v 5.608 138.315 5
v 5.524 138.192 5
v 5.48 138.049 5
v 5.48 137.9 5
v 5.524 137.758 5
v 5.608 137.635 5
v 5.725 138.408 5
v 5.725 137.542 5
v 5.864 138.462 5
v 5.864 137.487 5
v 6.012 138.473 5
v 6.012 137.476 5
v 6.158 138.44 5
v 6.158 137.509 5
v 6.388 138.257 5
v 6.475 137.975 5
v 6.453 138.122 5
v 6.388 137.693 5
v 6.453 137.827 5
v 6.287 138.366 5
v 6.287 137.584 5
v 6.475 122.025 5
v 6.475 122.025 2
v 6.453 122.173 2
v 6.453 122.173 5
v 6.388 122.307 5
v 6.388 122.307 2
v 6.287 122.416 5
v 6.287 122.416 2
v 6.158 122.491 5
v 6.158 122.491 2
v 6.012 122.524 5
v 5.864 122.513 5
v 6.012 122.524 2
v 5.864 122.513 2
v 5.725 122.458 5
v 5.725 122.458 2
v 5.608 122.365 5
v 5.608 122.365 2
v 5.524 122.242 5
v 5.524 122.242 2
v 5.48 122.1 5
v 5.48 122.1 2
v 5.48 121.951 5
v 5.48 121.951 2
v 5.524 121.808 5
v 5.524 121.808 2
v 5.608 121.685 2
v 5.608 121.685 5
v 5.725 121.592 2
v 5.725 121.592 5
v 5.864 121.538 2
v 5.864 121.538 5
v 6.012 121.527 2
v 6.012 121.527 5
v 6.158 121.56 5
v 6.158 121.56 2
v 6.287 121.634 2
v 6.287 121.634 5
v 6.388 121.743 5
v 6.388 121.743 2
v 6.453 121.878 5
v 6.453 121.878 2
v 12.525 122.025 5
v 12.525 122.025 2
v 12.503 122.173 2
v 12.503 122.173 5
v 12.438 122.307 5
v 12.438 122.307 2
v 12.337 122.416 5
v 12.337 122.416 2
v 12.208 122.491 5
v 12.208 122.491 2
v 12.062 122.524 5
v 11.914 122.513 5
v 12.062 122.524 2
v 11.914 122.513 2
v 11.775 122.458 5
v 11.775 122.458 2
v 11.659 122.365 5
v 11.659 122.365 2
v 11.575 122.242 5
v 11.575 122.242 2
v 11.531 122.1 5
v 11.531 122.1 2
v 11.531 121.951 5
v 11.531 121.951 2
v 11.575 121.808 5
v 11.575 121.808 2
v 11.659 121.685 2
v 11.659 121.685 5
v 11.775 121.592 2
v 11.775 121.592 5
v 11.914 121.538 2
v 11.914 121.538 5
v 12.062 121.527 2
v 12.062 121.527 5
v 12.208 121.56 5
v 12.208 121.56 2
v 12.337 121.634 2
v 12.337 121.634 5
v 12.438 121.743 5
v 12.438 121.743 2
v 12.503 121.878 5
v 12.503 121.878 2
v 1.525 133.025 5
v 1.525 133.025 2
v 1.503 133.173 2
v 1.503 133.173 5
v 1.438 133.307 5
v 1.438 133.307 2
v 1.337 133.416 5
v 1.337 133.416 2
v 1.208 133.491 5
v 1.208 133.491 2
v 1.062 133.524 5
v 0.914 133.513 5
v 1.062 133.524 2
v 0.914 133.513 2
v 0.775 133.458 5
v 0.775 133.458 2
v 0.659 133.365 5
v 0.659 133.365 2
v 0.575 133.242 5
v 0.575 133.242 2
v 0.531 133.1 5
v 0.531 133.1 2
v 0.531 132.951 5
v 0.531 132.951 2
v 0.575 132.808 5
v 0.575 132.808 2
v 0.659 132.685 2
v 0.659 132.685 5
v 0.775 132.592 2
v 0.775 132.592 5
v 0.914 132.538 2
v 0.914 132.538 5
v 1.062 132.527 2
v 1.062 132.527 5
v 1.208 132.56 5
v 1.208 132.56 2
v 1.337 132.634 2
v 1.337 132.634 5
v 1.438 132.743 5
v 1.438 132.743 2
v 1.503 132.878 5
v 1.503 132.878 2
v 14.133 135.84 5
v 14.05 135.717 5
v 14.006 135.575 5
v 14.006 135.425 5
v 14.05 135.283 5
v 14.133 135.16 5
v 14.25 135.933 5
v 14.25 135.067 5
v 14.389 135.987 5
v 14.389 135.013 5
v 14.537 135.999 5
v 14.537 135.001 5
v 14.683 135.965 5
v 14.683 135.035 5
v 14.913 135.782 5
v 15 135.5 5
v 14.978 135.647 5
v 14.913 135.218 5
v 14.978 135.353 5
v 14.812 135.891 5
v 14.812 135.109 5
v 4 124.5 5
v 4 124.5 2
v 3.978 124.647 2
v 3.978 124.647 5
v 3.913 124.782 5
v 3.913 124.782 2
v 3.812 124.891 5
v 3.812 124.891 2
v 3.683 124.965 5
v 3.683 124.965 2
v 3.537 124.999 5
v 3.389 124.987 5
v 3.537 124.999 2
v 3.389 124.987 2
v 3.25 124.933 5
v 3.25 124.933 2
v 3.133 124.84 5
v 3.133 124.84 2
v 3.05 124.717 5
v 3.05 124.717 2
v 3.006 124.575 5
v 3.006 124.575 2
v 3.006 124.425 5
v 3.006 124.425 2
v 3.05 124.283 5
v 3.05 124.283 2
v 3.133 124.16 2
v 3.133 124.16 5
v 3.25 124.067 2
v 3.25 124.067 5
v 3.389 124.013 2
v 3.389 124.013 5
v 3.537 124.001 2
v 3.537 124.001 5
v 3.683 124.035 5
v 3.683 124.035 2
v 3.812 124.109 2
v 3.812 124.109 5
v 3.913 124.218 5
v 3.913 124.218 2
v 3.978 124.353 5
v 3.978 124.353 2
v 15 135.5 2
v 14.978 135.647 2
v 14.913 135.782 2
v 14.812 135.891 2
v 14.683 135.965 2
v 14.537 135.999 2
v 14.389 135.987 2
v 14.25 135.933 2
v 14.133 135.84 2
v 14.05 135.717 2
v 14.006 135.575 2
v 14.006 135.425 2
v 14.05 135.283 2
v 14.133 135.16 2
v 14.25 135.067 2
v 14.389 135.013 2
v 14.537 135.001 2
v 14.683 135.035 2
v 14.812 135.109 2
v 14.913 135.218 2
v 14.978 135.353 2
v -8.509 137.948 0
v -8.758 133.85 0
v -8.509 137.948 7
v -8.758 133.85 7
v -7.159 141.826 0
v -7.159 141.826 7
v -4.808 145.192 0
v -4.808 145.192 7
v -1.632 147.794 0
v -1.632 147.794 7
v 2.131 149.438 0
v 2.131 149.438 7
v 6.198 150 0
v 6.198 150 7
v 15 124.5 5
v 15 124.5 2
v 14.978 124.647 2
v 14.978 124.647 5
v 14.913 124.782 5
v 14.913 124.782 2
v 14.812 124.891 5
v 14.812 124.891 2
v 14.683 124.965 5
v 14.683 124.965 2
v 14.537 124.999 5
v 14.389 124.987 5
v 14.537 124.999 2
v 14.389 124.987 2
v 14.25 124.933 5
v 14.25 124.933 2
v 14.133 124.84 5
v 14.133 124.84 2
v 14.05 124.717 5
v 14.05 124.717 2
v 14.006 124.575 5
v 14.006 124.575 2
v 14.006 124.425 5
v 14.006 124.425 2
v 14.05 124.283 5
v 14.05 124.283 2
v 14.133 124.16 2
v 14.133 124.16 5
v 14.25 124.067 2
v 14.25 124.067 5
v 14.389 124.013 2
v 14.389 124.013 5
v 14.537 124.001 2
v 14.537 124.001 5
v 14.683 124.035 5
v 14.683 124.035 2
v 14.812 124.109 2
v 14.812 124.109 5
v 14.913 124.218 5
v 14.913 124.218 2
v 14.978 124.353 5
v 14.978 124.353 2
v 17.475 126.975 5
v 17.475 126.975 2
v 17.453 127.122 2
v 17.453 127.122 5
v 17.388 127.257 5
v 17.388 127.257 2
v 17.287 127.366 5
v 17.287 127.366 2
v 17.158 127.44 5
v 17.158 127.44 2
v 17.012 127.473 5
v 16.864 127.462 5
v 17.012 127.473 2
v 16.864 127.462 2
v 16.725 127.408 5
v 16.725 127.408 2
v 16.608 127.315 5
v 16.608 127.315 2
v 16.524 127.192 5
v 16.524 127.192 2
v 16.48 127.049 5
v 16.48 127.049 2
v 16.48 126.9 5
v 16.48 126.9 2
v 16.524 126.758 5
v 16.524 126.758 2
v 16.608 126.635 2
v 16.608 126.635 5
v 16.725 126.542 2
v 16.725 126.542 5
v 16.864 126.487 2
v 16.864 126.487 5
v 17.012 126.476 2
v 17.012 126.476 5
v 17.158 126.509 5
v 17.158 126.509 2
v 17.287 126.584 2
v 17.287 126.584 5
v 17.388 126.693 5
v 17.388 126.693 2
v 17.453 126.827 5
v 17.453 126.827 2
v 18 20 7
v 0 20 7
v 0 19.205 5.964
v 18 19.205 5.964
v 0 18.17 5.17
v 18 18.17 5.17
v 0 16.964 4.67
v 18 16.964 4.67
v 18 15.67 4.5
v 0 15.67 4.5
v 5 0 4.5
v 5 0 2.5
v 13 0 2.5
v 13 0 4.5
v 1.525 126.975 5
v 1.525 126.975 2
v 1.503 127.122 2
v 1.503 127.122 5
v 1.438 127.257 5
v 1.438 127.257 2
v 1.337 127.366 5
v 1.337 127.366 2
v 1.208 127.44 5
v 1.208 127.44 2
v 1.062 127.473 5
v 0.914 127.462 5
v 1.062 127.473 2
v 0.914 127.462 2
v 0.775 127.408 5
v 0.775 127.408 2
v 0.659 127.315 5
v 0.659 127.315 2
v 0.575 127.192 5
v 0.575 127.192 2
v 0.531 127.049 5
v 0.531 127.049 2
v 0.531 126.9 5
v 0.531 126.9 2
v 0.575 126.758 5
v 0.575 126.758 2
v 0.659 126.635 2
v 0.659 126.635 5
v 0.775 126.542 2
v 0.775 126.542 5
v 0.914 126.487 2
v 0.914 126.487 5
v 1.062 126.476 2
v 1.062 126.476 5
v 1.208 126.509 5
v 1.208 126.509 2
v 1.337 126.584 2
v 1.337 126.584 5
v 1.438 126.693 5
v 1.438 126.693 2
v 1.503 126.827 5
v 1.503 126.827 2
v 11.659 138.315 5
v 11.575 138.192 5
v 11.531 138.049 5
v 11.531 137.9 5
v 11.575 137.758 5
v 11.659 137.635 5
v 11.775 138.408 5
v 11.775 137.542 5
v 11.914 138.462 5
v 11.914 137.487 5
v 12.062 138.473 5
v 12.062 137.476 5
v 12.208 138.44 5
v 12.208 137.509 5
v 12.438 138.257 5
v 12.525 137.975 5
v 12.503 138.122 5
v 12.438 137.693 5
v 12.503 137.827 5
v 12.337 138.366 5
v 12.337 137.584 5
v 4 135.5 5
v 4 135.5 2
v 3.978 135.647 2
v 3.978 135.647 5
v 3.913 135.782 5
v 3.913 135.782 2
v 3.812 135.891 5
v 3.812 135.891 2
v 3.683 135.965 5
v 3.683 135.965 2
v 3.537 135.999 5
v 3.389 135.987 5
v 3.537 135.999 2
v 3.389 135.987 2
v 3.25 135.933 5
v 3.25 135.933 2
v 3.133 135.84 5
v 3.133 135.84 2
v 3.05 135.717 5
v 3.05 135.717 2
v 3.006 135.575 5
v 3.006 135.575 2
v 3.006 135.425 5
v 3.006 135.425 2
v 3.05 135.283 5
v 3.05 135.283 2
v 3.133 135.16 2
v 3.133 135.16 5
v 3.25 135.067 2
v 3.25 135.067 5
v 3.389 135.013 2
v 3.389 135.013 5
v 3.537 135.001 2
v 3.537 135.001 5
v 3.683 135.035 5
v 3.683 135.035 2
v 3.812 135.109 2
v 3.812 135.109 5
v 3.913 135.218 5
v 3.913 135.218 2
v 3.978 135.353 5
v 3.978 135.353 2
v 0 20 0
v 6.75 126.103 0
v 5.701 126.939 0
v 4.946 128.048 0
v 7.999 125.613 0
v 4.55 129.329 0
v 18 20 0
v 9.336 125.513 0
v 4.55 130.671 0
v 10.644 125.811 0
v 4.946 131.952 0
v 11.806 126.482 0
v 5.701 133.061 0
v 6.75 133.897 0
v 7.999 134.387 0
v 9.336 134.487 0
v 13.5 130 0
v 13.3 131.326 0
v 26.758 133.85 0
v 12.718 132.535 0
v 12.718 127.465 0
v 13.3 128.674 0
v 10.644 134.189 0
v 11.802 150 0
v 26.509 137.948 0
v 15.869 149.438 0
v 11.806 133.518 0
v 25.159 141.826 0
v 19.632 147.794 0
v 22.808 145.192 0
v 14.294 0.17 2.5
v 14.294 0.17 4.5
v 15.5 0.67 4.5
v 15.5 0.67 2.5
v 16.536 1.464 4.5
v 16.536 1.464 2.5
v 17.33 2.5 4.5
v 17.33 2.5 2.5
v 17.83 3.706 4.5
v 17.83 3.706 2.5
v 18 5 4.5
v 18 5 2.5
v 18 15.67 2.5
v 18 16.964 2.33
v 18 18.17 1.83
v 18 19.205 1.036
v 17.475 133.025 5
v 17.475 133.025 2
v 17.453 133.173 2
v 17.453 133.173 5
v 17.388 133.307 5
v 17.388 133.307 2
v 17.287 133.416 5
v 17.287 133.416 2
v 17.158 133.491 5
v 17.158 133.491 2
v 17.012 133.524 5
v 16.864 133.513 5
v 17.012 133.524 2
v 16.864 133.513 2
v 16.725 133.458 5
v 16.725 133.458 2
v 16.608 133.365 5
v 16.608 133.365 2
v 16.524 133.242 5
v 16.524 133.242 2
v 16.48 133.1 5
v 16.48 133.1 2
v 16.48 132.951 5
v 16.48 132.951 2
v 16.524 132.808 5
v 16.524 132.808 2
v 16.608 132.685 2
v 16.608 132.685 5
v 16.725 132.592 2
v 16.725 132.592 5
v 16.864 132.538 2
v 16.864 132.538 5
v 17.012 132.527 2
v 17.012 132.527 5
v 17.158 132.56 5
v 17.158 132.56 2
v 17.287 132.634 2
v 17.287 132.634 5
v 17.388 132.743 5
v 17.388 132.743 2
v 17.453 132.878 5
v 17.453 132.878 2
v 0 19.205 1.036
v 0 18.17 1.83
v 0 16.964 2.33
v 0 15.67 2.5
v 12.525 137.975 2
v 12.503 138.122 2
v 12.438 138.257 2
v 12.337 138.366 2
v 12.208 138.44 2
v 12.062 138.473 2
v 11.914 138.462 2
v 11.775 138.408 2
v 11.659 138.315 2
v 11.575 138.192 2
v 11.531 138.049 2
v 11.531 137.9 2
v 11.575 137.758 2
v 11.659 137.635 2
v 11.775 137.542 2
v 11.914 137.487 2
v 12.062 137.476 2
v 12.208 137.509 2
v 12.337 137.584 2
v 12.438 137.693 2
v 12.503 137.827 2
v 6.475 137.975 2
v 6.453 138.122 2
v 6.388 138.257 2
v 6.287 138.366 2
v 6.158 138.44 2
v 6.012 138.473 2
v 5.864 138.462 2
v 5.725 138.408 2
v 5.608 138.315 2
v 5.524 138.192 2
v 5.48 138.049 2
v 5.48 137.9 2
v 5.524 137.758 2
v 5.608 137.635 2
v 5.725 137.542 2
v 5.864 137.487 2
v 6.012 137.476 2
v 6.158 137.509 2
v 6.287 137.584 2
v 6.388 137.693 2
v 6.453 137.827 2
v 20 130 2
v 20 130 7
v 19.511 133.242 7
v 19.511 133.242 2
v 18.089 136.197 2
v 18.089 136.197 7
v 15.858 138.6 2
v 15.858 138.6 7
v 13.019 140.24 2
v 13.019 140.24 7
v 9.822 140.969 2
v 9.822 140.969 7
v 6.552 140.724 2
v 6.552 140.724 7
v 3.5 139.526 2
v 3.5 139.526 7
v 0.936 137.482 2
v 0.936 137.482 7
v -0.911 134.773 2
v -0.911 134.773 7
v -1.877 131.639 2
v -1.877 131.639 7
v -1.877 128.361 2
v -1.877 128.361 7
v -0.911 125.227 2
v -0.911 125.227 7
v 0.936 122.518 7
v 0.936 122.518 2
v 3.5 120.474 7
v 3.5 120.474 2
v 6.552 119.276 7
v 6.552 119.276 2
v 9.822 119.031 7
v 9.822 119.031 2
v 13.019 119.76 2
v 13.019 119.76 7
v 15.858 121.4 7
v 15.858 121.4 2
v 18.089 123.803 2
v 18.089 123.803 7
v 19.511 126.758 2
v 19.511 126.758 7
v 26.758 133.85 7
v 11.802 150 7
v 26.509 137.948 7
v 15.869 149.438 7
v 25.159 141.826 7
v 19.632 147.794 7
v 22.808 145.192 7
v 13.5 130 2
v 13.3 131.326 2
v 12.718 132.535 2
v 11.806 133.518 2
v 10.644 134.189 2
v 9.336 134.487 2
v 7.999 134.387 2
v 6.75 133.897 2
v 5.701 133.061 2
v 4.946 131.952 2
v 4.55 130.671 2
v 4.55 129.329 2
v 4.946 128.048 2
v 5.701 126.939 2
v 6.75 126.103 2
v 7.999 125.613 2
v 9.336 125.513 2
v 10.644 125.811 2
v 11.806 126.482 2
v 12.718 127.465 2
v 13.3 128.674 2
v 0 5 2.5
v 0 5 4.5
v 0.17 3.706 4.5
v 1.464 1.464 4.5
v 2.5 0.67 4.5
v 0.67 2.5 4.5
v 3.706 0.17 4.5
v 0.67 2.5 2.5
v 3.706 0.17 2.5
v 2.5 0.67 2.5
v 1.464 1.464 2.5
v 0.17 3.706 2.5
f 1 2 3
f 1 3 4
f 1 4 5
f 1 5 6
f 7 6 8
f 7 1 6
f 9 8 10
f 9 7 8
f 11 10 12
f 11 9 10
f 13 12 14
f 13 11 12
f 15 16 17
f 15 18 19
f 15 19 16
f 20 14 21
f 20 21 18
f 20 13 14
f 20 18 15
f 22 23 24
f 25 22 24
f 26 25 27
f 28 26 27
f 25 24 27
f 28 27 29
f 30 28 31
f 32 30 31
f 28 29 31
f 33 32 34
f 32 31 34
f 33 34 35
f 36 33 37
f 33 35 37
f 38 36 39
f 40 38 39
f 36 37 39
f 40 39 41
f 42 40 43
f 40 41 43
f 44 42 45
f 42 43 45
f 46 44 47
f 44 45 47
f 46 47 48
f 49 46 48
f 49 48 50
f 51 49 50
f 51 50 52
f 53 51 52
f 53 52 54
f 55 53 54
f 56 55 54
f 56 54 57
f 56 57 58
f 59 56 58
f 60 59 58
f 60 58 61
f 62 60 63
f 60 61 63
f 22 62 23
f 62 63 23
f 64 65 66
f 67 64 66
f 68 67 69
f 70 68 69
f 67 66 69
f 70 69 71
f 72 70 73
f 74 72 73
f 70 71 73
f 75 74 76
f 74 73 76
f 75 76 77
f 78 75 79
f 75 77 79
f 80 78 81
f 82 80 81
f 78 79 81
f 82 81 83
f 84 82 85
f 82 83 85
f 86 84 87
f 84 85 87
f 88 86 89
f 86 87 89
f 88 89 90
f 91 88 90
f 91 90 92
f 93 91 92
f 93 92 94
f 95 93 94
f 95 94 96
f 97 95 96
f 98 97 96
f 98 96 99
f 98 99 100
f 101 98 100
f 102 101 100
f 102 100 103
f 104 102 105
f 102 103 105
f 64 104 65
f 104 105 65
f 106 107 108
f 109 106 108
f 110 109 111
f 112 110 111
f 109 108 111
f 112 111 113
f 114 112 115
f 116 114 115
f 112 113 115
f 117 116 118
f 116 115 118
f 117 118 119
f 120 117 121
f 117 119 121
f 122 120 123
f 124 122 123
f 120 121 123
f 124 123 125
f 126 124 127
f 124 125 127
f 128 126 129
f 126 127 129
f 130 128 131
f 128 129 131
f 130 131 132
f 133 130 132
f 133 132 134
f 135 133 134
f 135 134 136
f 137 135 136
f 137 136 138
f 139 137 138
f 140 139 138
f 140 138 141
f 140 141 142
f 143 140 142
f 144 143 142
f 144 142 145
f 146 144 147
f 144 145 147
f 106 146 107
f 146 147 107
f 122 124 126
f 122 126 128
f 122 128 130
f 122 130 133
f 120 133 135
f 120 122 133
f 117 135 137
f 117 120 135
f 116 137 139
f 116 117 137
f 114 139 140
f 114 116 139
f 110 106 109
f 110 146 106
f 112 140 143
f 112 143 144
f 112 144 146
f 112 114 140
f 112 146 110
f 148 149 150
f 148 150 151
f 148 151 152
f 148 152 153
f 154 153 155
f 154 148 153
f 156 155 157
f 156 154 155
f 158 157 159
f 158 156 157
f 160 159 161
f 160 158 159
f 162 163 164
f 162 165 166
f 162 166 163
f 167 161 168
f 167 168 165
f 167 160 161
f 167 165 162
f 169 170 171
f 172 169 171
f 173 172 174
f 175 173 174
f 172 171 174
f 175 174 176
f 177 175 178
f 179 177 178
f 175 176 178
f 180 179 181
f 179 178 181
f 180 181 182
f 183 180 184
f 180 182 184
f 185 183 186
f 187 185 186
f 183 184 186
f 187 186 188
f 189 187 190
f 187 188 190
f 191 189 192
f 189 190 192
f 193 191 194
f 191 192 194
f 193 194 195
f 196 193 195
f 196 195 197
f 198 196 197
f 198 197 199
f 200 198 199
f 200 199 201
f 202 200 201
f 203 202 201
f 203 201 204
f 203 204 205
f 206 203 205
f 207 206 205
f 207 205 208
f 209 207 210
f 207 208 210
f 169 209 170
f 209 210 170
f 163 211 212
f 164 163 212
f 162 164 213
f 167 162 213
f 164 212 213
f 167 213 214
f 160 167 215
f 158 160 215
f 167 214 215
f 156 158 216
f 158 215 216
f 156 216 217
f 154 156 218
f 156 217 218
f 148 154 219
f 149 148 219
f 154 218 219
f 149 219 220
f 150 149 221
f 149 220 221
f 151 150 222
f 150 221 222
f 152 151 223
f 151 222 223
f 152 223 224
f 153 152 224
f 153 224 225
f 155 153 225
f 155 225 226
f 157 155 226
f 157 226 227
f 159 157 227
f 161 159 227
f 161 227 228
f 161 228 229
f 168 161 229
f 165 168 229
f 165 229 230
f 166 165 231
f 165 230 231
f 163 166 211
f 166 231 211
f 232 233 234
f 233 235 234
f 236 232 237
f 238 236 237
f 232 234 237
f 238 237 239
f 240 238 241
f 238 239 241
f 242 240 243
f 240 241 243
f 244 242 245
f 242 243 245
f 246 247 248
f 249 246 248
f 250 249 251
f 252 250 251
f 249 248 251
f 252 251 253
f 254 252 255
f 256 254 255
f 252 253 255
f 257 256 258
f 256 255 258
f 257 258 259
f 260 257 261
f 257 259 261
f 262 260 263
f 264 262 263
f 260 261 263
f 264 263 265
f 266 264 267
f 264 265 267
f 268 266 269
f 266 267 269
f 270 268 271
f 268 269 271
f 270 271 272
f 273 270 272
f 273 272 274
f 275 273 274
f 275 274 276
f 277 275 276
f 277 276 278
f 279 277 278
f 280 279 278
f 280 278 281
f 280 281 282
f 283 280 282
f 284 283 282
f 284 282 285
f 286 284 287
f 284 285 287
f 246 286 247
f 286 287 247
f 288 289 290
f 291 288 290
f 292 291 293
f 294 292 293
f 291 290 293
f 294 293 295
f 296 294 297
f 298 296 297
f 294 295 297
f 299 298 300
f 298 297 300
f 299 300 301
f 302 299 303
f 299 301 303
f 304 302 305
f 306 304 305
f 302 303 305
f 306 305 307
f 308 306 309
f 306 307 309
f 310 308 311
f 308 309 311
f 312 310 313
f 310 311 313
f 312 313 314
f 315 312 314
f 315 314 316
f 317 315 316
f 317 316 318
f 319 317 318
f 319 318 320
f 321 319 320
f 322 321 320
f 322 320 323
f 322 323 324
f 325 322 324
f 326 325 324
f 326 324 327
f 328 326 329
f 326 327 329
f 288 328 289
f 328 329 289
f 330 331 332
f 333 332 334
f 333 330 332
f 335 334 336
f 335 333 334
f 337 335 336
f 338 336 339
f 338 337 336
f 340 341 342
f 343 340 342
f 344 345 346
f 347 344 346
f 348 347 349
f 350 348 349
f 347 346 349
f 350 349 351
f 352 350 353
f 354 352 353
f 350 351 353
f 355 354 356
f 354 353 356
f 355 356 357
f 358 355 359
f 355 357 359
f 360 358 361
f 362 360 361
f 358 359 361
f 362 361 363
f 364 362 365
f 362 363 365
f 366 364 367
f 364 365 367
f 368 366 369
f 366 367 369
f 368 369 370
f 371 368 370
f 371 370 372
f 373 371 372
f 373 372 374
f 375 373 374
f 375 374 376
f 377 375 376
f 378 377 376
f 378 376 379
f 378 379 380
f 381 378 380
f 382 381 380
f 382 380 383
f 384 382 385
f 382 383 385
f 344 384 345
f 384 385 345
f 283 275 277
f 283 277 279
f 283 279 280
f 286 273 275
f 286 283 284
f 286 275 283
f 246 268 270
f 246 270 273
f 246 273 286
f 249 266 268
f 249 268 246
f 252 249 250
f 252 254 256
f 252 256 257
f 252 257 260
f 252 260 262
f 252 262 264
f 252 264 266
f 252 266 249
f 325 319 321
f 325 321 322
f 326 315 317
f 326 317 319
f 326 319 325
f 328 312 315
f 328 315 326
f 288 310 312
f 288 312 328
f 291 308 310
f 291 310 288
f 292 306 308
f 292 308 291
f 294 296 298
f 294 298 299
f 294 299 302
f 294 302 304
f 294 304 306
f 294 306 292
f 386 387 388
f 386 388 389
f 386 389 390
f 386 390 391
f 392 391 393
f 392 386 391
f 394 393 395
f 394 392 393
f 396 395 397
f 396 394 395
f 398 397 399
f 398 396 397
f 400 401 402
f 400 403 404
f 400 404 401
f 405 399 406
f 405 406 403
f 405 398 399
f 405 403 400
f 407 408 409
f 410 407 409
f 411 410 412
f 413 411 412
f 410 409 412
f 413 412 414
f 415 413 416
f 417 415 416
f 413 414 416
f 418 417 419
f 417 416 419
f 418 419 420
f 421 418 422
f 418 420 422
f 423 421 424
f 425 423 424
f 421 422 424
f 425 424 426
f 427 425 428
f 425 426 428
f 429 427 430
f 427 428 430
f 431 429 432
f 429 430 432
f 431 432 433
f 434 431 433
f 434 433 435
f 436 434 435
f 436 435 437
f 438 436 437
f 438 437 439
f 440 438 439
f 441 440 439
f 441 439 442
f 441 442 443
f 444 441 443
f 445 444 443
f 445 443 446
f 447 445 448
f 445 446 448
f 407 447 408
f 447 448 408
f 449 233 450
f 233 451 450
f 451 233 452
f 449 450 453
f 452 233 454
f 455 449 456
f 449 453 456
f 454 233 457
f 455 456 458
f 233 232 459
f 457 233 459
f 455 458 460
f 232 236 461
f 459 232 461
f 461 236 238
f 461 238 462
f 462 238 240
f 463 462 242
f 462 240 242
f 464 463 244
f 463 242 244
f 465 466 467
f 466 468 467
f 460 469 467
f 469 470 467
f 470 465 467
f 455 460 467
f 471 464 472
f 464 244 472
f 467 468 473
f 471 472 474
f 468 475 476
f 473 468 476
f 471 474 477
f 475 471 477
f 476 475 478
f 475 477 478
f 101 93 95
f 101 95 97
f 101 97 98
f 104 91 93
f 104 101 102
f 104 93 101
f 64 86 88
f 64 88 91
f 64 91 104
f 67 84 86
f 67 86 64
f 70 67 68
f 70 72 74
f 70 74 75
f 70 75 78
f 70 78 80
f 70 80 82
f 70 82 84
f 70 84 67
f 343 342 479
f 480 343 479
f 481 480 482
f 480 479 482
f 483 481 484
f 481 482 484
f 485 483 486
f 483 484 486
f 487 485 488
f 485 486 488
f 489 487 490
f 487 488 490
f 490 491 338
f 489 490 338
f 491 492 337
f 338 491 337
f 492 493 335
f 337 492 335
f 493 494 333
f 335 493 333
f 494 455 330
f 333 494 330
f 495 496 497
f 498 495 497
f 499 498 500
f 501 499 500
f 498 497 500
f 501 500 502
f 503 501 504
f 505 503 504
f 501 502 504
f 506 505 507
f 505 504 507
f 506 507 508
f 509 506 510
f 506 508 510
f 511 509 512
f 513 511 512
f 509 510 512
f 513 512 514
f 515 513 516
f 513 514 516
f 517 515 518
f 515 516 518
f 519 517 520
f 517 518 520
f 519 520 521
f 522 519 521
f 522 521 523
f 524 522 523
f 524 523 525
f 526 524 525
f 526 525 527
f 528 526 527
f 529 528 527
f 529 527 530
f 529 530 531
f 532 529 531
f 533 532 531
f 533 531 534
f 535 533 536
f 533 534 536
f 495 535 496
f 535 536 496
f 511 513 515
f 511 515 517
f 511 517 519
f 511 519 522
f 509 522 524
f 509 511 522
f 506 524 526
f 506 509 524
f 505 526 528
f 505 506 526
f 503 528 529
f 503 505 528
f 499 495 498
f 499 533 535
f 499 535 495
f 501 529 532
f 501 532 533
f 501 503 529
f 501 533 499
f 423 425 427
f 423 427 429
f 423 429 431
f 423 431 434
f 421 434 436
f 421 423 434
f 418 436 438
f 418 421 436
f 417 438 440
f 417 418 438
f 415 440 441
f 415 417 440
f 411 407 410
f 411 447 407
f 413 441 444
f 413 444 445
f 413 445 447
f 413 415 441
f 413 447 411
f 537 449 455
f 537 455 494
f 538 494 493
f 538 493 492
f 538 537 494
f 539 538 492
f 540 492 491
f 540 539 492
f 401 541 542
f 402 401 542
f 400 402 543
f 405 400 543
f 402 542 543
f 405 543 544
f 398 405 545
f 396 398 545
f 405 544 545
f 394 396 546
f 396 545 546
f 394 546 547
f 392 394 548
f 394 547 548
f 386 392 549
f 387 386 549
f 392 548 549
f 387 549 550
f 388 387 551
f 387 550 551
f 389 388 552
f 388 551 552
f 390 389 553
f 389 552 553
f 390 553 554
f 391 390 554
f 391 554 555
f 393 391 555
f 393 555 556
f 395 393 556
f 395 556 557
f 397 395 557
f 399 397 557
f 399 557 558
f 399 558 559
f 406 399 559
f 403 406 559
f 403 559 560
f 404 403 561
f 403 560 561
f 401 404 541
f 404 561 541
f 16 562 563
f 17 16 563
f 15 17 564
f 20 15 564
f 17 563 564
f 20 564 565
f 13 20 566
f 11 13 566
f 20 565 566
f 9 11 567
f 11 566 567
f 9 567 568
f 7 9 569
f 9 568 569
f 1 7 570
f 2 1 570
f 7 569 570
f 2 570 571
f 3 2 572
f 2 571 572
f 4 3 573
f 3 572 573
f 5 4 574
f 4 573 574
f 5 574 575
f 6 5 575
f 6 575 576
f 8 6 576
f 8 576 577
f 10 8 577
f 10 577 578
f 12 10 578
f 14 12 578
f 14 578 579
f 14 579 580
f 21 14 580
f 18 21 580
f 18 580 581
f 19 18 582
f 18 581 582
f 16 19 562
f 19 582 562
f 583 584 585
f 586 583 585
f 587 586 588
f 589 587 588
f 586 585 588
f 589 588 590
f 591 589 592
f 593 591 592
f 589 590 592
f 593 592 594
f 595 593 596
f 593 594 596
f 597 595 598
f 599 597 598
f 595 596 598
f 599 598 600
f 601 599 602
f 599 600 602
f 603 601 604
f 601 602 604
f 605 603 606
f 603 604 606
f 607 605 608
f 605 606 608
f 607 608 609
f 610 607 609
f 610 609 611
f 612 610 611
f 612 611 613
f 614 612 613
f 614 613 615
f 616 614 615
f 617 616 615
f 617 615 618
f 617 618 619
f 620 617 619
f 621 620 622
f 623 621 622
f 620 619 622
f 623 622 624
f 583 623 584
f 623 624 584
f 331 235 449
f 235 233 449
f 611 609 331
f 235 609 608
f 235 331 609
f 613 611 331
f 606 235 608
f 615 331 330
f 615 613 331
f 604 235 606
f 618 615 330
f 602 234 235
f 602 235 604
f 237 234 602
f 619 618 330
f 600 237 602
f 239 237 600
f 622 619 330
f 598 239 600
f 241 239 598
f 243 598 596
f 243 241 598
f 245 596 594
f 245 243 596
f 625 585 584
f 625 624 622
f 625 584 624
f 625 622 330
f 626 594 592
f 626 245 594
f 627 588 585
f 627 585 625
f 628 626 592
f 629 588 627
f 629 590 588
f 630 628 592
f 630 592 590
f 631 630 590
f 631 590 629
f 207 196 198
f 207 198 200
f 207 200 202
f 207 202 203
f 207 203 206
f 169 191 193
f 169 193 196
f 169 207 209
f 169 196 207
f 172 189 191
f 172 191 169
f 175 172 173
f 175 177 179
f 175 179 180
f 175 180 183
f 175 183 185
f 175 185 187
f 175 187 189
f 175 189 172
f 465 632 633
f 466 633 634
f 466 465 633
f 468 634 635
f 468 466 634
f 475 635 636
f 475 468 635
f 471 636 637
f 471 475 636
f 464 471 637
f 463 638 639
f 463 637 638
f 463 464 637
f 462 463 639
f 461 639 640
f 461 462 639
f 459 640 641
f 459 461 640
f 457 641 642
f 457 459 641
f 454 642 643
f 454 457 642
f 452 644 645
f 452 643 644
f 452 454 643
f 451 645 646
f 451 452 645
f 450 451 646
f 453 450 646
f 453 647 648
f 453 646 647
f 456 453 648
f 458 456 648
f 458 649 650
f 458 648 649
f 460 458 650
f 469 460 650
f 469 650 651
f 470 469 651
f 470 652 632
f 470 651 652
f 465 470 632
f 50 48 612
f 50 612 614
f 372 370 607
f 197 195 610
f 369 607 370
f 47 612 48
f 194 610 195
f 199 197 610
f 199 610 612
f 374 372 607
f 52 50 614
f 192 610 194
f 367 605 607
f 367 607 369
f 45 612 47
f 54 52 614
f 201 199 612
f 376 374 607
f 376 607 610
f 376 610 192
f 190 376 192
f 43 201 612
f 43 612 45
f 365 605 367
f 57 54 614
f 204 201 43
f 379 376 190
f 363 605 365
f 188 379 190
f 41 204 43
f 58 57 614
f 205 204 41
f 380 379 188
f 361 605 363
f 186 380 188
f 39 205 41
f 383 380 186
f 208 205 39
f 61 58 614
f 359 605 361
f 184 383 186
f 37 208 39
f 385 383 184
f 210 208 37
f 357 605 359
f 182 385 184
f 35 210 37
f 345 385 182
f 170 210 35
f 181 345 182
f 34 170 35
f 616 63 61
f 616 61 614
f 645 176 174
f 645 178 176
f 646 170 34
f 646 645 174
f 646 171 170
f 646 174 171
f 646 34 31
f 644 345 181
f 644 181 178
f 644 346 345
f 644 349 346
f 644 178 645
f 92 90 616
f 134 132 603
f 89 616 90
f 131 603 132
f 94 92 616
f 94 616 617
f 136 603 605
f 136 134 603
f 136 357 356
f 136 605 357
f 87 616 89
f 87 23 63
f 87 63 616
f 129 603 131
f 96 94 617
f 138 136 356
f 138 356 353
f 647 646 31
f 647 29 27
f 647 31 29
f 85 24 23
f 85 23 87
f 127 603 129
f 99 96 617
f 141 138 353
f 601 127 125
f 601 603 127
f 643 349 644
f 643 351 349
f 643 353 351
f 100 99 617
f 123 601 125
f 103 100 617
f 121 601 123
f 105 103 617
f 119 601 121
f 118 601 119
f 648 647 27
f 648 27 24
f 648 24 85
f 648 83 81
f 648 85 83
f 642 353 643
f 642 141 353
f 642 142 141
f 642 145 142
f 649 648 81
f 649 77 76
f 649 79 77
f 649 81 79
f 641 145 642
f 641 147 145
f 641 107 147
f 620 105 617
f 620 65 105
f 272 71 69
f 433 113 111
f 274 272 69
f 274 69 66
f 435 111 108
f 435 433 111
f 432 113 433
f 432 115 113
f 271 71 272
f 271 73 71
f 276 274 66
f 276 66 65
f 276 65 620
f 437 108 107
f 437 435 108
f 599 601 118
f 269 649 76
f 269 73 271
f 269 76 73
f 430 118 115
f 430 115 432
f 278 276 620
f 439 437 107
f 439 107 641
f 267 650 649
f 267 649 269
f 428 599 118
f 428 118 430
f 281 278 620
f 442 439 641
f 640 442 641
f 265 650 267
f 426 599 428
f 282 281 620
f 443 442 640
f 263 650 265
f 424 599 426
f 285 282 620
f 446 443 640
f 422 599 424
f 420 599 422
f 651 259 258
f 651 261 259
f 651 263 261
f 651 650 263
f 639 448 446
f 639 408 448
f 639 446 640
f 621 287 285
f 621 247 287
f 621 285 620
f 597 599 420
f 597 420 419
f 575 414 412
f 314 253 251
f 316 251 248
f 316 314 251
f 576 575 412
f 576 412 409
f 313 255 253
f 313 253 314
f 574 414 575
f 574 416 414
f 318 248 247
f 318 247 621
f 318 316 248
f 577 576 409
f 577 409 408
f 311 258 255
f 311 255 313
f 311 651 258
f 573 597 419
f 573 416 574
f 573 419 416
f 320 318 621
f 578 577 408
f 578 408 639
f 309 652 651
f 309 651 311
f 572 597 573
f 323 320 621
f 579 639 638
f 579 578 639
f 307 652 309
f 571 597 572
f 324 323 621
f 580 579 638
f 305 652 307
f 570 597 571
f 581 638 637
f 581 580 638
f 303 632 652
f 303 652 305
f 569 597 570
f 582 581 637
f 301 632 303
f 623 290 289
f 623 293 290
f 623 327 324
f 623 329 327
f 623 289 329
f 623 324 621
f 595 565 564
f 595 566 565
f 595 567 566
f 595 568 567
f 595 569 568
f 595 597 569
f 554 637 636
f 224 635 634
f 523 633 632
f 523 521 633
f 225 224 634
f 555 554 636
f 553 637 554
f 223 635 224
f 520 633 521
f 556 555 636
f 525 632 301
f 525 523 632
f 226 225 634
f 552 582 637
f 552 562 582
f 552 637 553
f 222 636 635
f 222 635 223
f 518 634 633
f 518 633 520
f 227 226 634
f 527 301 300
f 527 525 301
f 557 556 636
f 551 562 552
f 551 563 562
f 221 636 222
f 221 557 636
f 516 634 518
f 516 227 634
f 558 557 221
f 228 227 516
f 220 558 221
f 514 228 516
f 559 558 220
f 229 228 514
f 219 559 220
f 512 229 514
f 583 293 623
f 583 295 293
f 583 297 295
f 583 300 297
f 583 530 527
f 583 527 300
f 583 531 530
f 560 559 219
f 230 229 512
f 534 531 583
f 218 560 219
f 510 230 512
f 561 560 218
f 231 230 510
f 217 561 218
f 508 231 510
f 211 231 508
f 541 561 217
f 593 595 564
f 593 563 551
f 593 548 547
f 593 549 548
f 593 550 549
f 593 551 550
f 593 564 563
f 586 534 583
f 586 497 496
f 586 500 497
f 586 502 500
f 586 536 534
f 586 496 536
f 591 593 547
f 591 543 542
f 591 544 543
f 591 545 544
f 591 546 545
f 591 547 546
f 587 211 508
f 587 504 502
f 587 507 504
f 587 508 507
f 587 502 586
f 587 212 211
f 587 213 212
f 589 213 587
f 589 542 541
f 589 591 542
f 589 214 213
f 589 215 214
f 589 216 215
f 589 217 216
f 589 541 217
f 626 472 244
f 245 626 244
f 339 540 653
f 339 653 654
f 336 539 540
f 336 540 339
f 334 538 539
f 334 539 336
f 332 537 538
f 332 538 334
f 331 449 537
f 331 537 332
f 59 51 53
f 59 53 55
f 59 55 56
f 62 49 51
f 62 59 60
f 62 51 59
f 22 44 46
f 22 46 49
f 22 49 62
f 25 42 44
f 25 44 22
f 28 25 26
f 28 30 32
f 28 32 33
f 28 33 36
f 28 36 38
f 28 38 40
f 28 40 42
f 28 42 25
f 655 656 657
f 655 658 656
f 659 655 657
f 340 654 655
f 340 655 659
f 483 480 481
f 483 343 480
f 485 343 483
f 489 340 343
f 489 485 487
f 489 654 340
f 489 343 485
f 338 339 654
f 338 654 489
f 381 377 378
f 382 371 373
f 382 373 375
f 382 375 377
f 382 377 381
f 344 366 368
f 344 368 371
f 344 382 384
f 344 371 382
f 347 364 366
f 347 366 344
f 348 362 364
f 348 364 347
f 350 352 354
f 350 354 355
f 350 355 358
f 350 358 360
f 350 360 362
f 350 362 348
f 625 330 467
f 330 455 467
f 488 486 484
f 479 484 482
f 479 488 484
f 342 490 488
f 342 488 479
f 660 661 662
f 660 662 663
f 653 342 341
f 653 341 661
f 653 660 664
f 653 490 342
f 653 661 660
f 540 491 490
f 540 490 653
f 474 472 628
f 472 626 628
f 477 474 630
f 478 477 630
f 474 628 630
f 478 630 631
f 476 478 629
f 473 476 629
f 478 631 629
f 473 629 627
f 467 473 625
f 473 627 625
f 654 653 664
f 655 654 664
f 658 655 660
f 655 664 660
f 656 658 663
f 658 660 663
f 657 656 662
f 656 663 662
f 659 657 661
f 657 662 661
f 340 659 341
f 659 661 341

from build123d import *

# Parameters (mm, degrees)
ESQUISSE1_R             = 4.5
ESQUISSE1_W             = 18
ESQUISSE1_H             = 20
BOSS_EXTRU_1_DEPTH      = 7
ESQUISSE2_R             = 11
ENL_V_MAT_EXTRU_1_DEPTH = 5
ESQUISSE3_R             = 0.5
BOSS_EXTRU_2_DEPTH      = 3
ESQUISSE4_W             = 18
ESQUISSE4_H             = 20
ENL_V_MAT_EXTRU_2_DEPTH = 2.5
ESQUISSE5_W             = 18
ESQUISSE5_H             = 20
ENL_V_MAT_EXTRU_3_DEPTH = 2.5
CONG_1_R                = 5
CONG_2_R                = 15


with BuildPart() as part:
    # Esquisse1 → Boss.-Extru.1 (new body)
    # profile 1 of 2: a face of its own
    with BuildSketch(Plane.XY):
        Polygon((18, 20), (28, 150), (18, 150), (0, 150), (-10, 150), (0, 20), align=None)
        with Locations((9, 130)):
            Circle(ESQUISSE1_R, mode=Mode.SUBTRACT)
    # profile 2 of 2: a face of its own
    with BuildSketch(Plane.XY):
        with Locations((9, 10)):
            Rectangle(ESQUISSE1_W, ESQUISSE1_H)
    extrude(amount=BOSS_EXTRU_1_DEPTH)

    # Esquisse2 → Enlèv. mat.-Extru.1 (cut)
    with BuildSketch(Plane.XY.offset(7)):
        with Locations((9, 130)):
            Circle(ESQUISSE2_R)
    extrude(amount=-ENL_V_MAT_EXTRU_1_DEPTH, mode=Mode.SUBTRACT)

    # Esquisse3 → Boss.-Extru.2 (add)
    with BuildSketch(Plane.XY.offset(2)):
        with Locations((3.5, 135.5)):
            Circle(ESQUISSE3_R)
        with Locations((5.974873734, 137.974873734)):
            Circle(ESQUISSE3_R)
        with Locations((1.025126266, 133.025126266)):
            Circle(ESQUISSE3_R)
        with Locations((1.025126266, 126.974873734)):
            Circle(ESQUISSE3_R)
        with Locations((3.5, 124.5)):
            Circle(ESQUISSE3_R)
        with Locations((5.974873734, 122.025126266)):
            Circle(ESQUISSE3_R)
        with Locations((12.025126266, 122.025126266)):
            Circle(ESQUISSE3_R)
        with Locations((14.5, 124.5)):
            Circle(ESQUISSE3_R)
        with Locations((16.974873734, 126.974873734)):
            Circle(ESQUISSE3_R)
        with Locations((16.974873734, 133.025126266)):
            Circle(ESQUISSE3_R)
        with Locations((14.5, 135.5)):
            Circle(ESQUISSE3_R)
        with Locations((12.025126266, 137.974873734)):
            Circle(ESQUISSE3_R)
    extrude(amount=BOSS_EXTRU_2_DEPTH)

    # Esquisse4 → Enlèv. mat.-Extru.2 (cut)
    with BuildSketch(Plane.XY.offset(7)):
        with Locations((9, 10)):
            Rectangle(ESQUISSE4_W, ESQUISSE4_H)
    extrude(amount=-ENL_V_MAT_EXTRU_2_DEPTH, mode=Mode.SUBTRACT)

    # Esquisse5 → Enlèv. mat.-Extru.3 (cut)
    with BuildSketch(Plane(origin=(0, 0, 0), x_dir=(-1, 0, 0), z_dir=(0, 0, -1))):
        with Locations((-9, 10)):
            Rectangle(ESQUISSE5_W, ESQUISSE5_H)
    extrude(amount=-ENL_V_MAT_EXTRU_3_DEPTH, mode=Mode.SUBTRACT)

    # Congé1
    # the kernel refuses this fillet: 5 mm, written as the material it adds along each edge
    with BuildSketch(Plane(origin=(0, 20, 2.5), x_dir=(0, 0, -1), z_dir=(1, 0, 0)), Plane(origin=(18, 20, 4.5), x_dir=(0, 0, 1), z_dir=(-1, 0, 0))) as cong_1_piece_1:
        with BuildLine():
            CenterArc((5, -4.330127019), CONG_1_R, 120, 60)
            Line((0, -4.330127019), (0, 0))
            Line((0, 0), (2.5, 0))
        make_face()
    extrude(amount=18)
    # the kernel refuses this fillet: 5 mm, written as the material it takes off along each edge
    with BuildSketch(Plane(origin=(18, 0, -10), x_dir=(-1, 0, 0), z_dir=(0, 0, 1)), Plane(origin=(0, 0, -10), x_dir=(0, 1, 0), z_dir=(0, 0, 1))) as cong_1_2_piece_1:
        with BuildLine():
            CenterArc((CONG_1_R, -CONG_1_R), CONG_1_R, 90, 90)
            Line((0, -CONG_1_R), (0, 0))
            Line((0, 0), (CONG_1_R, 0))
        make_face()
    extrude(amount=27, mode=Mode.SUBTRACT)

    # Congé2
    cong_2_edges = [part.edges().sort_by_distance(p)[0] for p in [
        (-10, 150, 3.5),
        (28, 150, 3.5),
    ]]
    fillet(cong_2_edges, radius=CONG_2_R)


solid = part.part
